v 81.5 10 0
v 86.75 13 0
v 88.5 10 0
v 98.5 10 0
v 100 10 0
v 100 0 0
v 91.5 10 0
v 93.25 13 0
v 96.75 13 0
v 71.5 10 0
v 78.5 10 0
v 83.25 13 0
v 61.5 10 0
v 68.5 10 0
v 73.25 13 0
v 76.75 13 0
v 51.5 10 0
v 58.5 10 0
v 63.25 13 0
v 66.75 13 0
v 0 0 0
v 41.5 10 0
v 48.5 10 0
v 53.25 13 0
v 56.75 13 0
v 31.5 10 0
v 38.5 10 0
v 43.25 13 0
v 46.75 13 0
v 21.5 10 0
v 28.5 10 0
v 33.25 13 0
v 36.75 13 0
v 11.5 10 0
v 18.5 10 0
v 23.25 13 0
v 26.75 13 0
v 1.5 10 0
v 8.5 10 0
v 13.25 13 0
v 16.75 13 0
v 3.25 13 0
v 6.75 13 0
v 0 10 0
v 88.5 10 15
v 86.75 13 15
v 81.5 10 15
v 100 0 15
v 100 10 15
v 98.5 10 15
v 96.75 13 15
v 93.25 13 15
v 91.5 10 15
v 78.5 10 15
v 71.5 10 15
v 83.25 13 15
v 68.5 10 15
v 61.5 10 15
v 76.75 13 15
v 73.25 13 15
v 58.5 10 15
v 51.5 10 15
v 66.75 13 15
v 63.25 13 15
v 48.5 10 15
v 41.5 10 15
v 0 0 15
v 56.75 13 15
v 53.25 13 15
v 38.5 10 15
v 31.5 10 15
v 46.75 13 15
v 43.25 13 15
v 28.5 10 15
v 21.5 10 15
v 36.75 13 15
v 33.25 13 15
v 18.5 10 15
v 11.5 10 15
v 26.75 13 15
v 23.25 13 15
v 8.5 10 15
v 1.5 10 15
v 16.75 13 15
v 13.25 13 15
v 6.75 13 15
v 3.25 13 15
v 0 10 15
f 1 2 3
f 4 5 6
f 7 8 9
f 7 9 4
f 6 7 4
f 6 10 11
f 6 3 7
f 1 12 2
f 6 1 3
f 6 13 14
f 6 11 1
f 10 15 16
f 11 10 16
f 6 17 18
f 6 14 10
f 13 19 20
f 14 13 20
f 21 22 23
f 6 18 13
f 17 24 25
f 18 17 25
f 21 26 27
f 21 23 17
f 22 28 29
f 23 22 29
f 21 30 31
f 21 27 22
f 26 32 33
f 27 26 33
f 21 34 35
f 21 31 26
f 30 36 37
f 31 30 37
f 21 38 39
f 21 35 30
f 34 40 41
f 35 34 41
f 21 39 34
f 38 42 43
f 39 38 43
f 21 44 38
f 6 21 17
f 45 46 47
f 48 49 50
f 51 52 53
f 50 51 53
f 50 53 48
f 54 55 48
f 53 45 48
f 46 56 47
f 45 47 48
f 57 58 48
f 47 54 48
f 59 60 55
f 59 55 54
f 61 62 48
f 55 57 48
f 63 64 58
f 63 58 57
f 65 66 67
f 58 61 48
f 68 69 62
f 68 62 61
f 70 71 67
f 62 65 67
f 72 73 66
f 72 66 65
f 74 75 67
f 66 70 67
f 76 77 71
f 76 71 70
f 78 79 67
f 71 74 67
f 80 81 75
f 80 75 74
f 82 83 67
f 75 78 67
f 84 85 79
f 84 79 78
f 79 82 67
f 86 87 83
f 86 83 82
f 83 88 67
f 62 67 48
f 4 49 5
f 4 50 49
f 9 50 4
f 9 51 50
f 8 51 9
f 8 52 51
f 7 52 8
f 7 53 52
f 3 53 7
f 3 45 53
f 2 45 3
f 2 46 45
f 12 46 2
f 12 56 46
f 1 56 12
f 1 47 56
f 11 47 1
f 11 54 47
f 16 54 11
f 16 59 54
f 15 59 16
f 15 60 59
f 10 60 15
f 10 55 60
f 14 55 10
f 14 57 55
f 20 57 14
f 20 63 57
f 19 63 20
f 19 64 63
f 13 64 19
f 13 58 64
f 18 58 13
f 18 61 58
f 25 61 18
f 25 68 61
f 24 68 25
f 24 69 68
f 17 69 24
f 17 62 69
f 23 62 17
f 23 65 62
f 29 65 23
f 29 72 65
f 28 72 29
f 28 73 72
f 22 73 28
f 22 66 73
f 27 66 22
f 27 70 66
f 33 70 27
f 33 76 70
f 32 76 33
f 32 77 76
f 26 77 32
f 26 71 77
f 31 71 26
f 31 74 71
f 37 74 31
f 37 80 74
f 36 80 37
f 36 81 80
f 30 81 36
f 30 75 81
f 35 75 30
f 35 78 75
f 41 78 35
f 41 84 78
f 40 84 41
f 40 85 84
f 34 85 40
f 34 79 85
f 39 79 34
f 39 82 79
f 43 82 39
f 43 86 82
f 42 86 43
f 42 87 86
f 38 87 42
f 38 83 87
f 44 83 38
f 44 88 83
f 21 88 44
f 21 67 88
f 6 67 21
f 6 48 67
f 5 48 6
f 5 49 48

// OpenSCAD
$fn = 32;

// ----------------------------------------------------------------------
// Gear rack: 10 teeth, pitch 10 mm
// ----------------------------------------------------------------------

// --- parameters (mm) ---
teeth = 10;               // number of teeth
pitch = 10;               // tooth pitch, X
root_w = 7;               // tooth width at the root
tip_w = 3.5;              // tooth width at the tip
base_h = 10;              // rack body height, Y
tooth_h = 3;              // tooth height above the body
plate_t = 15;             // rack width, Z (extrusion height)
fit_tol = 0.1;            // declared fit tolerance (prompt contract)
free_tol = 0.5;           // declared free tolerance (prompt contract)

rack_l = teeth * pitch;  // overall length
total_h = base_h + tooth_h;  // overall height

profile = [[0, 0], [100, 0], [100, 10], [98.5, 10], [96.75, 13], [93.25, 13], [91.5, 10], [88.5, 10], [86.75, 13], [83.25, 13], [81.5, 10], [78.5, 10], [76.75, 13], [73.25, 13], [71.5, 10], [68.5, 10], [66.75, 13], [63.25, 13], [61.5, 10], [58.5, 10], [56.75, 13], [53.25, 13], [51.5, 10], [48.5, 10], [46.75, 13], [43.25, 13], [41.5, 10], [38.5, 10], [36.75, 13], [33.25, 13], [31.5, 10], [28.5, 10], [26.75, 13], [23.25, 13], [21.5, 10], [18.5, 10], [16.75, 13], [13.25, 13], [11.5, 10], [8.5, 10], [6.75, 13], [3.25, 13], [1.5, 10], [0, 10]];  // primary outline, 44 points, counter clockwise

// --- the one profile operation ---
linear_extrude(height = plate_t) polygon(points = profile);
